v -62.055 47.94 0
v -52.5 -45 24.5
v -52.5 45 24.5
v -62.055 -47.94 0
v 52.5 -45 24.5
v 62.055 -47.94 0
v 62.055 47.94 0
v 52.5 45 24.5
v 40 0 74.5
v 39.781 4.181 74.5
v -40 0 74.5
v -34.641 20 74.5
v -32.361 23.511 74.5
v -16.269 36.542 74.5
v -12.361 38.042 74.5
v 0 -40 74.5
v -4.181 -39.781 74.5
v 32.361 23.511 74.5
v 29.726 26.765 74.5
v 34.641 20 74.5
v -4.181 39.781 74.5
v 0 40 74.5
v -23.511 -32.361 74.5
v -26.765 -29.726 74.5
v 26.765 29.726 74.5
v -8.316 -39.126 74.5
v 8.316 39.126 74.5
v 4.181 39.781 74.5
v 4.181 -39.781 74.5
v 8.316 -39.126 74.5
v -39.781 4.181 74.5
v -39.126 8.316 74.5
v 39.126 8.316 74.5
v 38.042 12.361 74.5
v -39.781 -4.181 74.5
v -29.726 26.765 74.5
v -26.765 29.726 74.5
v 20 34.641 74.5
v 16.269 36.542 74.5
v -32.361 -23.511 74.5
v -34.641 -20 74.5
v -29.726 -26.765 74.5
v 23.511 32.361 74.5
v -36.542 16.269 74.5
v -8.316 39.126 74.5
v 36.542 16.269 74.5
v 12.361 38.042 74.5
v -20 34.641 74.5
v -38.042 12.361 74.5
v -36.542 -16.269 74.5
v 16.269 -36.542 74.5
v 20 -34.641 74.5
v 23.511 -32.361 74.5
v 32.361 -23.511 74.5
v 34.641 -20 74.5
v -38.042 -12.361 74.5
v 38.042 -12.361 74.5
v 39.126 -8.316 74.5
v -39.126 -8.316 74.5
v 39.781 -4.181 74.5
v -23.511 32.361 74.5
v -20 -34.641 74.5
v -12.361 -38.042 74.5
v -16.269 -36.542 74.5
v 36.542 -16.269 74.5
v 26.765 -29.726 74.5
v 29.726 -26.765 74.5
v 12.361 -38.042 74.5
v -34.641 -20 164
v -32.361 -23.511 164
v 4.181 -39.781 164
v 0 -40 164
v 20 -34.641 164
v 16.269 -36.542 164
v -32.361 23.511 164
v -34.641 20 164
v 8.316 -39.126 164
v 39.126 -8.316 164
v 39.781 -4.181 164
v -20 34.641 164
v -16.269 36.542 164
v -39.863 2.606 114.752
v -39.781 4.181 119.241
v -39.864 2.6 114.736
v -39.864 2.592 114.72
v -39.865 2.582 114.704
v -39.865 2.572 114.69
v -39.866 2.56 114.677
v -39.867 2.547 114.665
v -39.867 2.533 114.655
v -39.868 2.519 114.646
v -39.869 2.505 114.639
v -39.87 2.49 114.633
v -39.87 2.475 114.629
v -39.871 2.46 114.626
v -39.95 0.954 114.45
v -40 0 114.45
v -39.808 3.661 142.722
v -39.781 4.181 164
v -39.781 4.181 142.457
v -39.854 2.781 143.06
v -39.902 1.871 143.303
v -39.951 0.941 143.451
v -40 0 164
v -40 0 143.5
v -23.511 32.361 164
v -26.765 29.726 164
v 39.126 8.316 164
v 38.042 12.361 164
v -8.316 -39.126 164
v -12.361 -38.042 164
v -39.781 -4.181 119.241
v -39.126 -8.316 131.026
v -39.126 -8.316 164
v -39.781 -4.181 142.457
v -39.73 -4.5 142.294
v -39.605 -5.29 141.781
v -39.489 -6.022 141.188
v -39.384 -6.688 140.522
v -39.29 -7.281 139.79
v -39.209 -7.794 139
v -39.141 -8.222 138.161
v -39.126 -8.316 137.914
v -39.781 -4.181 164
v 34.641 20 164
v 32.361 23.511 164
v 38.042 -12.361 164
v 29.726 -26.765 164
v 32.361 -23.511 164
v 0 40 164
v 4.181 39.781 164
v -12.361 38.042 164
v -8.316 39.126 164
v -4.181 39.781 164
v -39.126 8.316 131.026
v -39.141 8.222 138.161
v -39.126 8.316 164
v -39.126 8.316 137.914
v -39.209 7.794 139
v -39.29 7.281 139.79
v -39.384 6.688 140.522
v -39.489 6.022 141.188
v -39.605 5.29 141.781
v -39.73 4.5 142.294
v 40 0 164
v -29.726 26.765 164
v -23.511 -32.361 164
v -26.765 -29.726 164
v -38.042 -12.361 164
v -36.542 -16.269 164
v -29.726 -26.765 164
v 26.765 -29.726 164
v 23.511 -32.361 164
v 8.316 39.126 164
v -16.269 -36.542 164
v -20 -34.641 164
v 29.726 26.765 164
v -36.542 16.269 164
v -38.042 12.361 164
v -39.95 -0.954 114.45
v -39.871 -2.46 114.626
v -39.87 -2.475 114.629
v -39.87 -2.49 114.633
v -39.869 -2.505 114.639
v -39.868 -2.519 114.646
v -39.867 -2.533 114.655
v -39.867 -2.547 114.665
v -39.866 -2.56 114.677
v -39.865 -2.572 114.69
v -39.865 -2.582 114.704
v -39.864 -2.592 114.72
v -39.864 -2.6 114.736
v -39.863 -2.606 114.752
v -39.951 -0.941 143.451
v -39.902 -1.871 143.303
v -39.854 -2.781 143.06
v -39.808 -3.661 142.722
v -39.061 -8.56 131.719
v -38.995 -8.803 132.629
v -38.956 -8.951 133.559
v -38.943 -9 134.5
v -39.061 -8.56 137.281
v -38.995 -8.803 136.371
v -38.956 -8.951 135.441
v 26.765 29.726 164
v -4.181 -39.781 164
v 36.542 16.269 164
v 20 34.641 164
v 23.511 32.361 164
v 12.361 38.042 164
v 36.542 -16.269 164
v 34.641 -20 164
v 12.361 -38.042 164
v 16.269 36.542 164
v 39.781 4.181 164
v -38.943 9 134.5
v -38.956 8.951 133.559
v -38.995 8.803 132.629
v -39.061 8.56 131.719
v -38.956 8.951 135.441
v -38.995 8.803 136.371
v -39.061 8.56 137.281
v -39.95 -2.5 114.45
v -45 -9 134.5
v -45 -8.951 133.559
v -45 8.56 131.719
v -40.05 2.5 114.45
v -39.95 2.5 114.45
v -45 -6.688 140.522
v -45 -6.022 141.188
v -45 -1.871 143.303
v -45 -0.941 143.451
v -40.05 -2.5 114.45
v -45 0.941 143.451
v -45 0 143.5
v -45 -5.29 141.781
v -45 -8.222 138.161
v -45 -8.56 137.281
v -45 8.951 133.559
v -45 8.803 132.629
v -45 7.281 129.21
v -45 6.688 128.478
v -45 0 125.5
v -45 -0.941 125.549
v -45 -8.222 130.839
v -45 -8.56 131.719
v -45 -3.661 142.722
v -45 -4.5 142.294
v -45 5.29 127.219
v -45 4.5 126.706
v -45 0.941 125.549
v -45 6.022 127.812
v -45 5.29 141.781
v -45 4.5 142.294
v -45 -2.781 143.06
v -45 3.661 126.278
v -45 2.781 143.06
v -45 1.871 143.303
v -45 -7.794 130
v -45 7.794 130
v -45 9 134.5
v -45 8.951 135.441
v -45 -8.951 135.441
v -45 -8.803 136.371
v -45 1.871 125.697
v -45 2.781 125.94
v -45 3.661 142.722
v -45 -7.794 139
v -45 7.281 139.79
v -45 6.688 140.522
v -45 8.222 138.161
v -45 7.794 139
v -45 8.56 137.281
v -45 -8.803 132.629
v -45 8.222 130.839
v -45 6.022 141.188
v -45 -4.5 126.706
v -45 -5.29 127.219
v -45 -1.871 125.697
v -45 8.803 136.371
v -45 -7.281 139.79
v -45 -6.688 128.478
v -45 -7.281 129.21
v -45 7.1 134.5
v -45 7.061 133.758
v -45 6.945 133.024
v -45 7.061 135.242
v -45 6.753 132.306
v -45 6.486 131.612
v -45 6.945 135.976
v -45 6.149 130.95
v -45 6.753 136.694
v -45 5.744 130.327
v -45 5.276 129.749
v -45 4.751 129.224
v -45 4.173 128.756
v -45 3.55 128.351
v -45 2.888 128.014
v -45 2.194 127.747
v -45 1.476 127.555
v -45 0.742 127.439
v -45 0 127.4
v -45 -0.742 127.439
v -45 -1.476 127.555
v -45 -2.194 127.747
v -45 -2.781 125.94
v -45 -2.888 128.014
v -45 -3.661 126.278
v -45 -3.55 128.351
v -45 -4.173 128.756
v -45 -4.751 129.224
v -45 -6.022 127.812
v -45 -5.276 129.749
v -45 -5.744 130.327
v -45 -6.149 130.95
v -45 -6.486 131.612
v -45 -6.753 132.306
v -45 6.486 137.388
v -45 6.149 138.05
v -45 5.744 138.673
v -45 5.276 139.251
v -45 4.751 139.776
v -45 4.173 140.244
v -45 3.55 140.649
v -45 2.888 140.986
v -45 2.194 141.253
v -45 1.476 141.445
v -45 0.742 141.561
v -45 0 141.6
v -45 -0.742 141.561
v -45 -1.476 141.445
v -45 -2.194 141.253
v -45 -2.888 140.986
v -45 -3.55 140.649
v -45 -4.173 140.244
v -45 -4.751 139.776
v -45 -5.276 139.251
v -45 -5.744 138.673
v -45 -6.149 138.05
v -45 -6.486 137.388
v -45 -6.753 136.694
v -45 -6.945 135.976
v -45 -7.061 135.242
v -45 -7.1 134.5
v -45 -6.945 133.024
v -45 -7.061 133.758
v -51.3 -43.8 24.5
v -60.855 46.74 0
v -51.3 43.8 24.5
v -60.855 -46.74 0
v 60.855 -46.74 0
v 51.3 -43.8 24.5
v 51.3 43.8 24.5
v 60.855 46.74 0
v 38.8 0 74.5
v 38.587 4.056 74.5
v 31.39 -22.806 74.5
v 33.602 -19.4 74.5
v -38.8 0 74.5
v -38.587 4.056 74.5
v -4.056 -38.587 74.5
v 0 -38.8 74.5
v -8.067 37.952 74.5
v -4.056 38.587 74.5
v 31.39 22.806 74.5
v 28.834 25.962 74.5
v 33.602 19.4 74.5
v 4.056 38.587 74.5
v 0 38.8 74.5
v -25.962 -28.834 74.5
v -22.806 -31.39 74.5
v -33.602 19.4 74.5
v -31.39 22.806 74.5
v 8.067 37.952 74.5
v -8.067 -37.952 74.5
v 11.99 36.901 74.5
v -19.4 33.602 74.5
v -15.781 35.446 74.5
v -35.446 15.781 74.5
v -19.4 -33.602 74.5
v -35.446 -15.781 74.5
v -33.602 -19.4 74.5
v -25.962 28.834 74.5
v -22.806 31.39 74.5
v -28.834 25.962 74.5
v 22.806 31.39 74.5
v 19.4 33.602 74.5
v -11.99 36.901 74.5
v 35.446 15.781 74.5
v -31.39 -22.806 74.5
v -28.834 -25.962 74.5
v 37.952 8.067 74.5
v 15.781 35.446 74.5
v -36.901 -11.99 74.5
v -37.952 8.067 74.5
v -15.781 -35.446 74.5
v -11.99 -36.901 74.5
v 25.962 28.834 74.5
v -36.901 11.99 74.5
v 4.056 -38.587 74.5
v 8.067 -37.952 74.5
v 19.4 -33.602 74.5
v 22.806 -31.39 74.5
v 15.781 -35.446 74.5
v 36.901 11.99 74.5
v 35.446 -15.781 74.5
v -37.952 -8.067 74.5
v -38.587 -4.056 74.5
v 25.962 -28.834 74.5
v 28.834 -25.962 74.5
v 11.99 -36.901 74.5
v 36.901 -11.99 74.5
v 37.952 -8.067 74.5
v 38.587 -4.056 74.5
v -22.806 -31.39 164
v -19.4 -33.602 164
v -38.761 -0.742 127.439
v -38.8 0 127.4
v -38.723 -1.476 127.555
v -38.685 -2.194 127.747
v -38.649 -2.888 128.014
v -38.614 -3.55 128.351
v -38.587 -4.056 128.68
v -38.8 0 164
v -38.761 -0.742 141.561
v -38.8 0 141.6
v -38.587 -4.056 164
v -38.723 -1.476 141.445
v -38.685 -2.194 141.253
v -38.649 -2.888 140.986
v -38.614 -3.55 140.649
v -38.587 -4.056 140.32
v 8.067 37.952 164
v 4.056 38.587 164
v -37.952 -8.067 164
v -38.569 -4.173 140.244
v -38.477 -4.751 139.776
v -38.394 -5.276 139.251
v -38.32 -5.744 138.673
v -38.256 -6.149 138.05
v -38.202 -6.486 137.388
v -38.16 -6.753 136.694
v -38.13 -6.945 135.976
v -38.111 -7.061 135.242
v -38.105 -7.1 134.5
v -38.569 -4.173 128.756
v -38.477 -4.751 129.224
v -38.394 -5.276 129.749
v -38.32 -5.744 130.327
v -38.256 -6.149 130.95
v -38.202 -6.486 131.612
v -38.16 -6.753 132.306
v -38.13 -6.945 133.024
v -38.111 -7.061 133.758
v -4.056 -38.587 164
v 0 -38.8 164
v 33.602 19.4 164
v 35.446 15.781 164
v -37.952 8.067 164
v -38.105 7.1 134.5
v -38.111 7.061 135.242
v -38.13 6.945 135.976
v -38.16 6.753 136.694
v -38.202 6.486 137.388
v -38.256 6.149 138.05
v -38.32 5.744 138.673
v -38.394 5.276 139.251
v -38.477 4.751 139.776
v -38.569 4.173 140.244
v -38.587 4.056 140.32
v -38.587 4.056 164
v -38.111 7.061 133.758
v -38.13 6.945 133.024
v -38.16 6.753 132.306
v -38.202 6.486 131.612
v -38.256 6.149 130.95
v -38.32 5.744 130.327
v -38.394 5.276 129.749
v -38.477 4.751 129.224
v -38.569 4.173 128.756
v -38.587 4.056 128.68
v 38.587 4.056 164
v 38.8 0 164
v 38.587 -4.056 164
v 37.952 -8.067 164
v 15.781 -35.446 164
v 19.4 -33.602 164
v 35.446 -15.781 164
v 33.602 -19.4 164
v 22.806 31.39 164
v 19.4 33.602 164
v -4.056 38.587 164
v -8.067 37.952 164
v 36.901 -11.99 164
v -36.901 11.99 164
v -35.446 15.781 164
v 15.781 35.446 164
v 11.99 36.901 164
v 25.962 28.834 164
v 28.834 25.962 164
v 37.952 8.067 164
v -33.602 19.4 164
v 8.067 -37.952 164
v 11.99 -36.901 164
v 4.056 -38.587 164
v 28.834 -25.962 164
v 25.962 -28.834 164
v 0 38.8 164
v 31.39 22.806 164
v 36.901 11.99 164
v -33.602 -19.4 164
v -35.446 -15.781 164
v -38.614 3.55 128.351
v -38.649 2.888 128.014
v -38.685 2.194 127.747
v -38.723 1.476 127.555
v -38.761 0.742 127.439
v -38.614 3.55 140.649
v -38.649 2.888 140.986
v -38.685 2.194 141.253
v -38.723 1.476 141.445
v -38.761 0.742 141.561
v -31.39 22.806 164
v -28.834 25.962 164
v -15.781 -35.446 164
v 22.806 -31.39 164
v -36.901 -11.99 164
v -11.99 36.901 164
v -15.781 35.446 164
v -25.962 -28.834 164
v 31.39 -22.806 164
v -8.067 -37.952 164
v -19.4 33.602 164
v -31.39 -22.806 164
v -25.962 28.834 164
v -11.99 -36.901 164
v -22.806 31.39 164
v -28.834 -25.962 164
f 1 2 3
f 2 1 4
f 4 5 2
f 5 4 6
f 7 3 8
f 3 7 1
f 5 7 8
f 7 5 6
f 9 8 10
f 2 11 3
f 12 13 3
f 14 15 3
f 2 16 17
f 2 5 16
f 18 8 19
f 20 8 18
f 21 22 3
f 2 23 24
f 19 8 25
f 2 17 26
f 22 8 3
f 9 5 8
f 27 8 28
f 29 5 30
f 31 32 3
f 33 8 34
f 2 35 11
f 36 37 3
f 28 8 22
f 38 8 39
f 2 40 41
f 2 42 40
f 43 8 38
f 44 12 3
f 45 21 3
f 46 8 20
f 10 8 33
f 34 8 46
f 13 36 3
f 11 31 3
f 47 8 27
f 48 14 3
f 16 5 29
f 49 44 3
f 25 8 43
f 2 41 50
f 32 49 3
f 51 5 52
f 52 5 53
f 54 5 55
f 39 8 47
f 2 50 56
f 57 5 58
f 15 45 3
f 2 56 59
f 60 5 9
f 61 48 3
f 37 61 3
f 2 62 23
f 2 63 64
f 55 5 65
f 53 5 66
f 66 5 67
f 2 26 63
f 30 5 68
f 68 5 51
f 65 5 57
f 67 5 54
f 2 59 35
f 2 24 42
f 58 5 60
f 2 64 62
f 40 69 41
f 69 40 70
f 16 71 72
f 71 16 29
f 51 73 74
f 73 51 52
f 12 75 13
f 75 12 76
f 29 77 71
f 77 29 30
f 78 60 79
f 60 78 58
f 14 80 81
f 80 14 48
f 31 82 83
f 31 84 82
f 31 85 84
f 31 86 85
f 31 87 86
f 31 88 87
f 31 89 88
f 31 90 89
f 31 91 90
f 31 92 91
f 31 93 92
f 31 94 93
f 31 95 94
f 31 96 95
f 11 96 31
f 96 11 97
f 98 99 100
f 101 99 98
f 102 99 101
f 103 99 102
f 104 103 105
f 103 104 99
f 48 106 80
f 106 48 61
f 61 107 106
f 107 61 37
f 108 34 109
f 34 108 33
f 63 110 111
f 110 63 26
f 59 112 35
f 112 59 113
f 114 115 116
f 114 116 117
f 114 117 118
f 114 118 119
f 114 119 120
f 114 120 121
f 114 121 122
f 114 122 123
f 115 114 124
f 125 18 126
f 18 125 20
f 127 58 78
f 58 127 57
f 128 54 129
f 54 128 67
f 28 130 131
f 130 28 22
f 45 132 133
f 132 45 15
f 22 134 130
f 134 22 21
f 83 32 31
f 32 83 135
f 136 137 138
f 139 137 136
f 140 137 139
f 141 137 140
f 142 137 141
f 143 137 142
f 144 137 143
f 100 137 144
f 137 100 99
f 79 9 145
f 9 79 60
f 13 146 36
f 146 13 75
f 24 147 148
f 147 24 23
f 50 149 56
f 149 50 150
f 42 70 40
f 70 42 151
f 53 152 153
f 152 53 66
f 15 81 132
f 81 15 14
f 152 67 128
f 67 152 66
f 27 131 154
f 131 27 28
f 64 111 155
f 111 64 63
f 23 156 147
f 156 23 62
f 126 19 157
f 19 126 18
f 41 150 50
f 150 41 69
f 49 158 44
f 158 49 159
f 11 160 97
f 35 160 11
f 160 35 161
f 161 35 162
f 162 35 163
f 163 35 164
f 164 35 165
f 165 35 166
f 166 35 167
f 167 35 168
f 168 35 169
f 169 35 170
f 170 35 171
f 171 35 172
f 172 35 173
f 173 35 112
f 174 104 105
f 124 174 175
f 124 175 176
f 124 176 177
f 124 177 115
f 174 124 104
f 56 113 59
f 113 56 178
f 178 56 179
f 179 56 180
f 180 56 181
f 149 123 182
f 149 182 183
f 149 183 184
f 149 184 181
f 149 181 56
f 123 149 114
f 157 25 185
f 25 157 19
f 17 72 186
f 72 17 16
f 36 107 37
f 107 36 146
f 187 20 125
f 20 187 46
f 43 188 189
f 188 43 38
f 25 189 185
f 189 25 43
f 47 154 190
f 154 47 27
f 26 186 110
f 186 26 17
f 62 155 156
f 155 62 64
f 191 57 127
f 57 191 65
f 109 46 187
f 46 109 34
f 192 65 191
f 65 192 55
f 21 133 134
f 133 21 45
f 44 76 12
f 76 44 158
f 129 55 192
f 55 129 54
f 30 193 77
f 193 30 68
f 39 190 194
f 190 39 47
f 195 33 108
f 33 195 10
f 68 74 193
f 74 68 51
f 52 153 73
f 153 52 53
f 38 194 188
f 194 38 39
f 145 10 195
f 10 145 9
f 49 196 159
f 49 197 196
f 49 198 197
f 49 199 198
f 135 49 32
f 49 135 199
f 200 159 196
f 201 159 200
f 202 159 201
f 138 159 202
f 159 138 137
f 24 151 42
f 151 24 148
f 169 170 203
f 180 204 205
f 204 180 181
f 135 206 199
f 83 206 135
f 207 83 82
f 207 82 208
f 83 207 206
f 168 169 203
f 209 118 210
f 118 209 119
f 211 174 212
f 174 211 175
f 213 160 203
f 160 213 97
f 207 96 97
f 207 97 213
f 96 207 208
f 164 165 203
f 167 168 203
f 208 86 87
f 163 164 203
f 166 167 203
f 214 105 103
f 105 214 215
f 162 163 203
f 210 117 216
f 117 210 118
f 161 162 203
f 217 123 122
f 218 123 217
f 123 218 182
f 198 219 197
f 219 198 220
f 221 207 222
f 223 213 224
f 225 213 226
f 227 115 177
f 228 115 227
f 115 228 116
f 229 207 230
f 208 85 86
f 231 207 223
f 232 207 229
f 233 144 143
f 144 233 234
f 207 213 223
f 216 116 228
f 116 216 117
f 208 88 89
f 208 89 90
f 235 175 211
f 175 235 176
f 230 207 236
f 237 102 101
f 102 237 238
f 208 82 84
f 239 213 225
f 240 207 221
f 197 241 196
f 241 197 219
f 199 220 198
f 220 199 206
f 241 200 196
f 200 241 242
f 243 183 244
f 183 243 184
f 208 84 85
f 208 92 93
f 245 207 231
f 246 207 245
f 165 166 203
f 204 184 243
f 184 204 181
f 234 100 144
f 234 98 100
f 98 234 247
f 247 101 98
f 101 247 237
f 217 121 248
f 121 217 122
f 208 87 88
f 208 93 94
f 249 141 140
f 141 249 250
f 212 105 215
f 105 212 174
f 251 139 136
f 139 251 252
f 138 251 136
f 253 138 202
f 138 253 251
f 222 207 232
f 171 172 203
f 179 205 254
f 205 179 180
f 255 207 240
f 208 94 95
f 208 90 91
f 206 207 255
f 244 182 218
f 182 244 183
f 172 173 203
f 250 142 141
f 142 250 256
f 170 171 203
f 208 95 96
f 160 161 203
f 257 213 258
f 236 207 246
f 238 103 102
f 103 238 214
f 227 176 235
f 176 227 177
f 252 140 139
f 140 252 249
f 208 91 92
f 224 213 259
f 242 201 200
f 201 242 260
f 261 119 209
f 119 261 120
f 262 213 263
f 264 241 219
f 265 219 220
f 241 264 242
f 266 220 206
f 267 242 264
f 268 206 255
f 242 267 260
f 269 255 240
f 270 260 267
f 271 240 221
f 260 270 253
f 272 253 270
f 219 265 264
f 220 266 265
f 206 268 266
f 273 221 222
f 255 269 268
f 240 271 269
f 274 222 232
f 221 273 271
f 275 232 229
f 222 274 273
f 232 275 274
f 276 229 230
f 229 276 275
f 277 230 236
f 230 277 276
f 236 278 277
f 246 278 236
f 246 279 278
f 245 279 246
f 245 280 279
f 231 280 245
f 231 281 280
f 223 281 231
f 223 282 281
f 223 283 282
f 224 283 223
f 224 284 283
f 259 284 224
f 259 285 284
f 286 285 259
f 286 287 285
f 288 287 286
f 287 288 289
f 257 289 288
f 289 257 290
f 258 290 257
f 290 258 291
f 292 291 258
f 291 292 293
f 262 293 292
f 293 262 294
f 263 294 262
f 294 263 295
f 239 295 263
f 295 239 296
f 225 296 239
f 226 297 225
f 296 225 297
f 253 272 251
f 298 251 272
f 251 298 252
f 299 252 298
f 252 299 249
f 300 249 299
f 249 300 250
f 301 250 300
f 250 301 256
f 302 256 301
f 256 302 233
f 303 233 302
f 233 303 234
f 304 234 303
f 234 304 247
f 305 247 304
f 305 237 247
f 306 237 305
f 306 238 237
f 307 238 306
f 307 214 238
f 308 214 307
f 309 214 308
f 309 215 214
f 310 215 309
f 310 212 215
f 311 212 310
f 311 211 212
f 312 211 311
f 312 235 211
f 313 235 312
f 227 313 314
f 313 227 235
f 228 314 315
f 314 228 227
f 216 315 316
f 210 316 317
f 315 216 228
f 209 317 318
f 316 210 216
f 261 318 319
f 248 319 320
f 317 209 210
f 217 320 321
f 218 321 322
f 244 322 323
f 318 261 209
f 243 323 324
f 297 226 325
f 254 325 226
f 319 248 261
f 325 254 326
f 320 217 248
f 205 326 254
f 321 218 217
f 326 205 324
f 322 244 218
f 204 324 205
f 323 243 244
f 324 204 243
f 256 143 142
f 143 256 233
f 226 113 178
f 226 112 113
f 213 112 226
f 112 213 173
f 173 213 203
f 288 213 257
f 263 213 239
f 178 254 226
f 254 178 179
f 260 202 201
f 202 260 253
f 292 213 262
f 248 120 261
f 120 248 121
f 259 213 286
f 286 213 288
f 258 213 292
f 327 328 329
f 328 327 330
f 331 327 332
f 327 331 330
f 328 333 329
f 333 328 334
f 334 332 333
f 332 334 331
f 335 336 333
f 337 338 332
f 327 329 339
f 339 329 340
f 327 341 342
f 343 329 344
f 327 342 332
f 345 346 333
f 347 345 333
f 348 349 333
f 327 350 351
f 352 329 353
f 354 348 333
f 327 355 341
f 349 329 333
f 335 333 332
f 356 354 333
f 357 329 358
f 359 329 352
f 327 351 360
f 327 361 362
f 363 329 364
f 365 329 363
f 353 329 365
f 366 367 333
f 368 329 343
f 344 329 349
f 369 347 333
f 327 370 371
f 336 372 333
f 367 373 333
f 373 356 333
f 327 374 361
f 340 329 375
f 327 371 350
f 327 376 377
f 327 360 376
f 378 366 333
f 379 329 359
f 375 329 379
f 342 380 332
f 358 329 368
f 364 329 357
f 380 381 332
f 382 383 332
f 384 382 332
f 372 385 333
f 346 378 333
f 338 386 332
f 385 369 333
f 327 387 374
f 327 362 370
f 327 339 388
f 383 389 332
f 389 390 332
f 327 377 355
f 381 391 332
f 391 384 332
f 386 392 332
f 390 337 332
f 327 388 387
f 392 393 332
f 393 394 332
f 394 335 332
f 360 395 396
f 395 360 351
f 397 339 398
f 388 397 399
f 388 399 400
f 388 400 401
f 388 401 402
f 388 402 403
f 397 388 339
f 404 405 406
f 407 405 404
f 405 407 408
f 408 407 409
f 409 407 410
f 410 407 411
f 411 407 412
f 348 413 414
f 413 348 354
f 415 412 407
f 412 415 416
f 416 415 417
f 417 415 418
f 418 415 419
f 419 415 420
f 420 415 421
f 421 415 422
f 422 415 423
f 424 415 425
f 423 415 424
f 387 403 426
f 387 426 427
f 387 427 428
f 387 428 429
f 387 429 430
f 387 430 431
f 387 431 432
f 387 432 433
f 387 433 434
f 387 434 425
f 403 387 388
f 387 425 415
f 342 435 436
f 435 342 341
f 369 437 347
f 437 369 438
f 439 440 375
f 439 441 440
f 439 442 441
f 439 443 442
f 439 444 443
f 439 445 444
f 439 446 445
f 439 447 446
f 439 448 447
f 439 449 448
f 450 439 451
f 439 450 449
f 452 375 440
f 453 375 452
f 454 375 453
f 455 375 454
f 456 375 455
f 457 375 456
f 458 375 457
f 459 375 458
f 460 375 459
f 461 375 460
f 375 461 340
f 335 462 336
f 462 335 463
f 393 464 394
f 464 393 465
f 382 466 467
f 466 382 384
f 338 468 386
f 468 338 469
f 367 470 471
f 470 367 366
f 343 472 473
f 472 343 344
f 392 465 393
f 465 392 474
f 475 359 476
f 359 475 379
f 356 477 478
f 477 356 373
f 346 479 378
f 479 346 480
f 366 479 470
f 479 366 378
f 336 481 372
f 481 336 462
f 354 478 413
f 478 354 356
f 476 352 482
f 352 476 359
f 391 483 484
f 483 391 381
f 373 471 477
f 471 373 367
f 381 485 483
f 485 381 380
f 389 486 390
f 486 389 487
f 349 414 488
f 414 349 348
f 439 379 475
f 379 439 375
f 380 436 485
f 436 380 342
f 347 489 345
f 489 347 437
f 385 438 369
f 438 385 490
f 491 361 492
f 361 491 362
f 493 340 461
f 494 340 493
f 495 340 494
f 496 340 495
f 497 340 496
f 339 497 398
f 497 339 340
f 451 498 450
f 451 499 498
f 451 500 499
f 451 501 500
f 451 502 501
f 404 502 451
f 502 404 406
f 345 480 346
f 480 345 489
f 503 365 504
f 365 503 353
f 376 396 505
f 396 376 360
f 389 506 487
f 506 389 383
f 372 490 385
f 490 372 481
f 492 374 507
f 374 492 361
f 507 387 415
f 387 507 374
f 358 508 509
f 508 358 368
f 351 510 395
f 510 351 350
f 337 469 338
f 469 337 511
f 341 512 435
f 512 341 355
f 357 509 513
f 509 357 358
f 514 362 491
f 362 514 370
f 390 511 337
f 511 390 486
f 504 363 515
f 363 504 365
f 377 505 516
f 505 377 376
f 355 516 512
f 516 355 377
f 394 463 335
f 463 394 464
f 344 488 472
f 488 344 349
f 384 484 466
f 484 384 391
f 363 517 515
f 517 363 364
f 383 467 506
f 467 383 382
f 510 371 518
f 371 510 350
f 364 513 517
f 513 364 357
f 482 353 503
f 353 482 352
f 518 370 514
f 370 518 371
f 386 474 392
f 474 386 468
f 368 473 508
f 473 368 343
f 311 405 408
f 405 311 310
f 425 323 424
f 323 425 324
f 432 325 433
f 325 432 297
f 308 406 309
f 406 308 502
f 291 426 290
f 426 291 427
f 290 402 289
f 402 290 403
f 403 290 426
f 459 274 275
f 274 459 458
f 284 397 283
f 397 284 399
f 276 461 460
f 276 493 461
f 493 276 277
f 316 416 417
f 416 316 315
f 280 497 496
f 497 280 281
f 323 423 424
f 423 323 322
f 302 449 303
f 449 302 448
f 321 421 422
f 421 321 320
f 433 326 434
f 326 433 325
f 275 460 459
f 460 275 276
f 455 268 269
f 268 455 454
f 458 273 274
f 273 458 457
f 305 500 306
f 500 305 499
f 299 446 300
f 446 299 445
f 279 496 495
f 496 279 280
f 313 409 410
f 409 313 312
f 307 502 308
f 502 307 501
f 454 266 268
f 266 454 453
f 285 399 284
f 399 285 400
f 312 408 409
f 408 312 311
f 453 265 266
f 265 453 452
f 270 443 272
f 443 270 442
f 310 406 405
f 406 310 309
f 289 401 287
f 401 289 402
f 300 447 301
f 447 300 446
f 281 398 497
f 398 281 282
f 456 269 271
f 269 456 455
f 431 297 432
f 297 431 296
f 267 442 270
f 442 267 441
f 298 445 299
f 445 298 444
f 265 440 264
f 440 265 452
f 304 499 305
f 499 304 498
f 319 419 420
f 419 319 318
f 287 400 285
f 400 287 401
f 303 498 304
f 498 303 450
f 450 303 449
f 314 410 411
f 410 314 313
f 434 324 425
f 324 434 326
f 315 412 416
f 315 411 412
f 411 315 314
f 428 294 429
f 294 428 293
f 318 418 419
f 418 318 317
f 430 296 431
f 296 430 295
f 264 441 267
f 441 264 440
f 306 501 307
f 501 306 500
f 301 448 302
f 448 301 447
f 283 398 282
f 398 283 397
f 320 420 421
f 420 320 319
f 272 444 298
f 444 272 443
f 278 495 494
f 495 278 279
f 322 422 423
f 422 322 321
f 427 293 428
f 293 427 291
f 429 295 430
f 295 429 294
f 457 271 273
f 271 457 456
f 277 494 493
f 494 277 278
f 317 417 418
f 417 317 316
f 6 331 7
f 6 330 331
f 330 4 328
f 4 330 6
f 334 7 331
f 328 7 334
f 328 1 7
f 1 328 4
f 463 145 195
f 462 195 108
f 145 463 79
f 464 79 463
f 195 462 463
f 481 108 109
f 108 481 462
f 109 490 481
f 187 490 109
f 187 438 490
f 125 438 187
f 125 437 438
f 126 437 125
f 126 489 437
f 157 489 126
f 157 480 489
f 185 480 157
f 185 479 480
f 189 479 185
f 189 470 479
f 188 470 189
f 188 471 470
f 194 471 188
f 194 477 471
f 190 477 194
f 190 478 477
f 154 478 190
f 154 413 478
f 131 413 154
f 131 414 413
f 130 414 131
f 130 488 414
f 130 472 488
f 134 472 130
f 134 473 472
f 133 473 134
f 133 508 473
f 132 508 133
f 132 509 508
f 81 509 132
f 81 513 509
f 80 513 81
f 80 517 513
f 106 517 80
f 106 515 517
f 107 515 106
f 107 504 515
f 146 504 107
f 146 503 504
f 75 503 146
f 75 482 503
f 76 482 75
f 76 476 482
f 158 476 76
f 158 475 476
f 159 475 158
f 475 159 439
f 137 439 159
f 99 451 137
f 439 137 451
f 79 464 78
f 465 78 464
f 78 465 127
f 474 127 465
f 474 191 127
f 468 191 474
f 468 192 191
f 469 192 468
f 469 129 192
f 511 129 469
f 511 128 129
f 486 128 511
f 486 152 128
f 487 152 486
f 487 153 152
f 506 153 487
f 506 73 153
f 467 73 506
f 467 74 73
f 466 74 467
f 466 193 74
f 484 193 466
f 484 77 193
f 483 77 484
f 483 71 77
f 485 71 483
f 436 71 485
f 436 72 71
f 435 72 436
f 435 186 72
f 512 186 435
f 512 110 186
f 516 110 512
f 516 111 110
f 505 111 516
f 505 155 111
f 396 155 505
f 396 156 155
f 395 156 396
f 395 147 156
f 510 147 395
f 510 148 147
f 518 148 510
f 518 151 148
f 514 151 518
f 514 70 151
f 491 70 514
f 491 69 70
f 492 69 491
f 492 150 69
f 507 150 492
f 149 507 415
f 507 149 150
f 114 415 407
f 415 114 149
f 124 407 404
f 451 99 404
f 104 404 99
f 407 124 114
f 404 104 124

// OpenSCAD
module manif1(d) {
  union() {
    hull() {
      translate([0, 0, 0.25+300])
        cube([300-d*2, 150-d*2, 0.5], center=true);
      translate([0, 0, 0.25+50])
        cube([300*.35-d*2, 150*.6-d*2, 0.5], center=true);
    }

    hull() {
      translate([0, 0, 0.25+50])
        cube([300*.35-d*2, 150*.6-d*2, 0.5], center=true);
      translate([0, 0, 0.25])
        cylinder(r1=40-d, r2=40-d,$fn=60, h=0.5, center=true);     
    }

    hull() {
      translate([0, 0, 0.25])
        cylinder(r1=40-d, r2=40-d,$fn=60, h=0.5, center=true);     

      translate([0, 0, 0.25-100])
        cylinder(r1=40-d, r2=40-d,$fn=60, h=0.5, center=true);     
    }
  }
}

translate([0, 0, 139/2+5])
  rotate([0, 180, 0])
    intersection() {
      difference() {
        union() {
          manif1(0);
          translate([40, 0, -60]) {
            hull() {
              translate([0, 0, 20])
                cube([0.1, 5, 0.1], center=true);
              rotate([0, 90, 0])
                cylinder(r1=9, r2=9, $fn=60, h=10, center=true);          
            }
          }
        }
        union() { 
          manif1(1.2);
          translate([40, 0, -60]) 
            rotate([0, 90, 0])
              cylinder(r1=14.2/2, r2=14.2/2, $fn=60, h=12, center=true);
        }        
      }      
      translate([0, 0, 5-25/2])
        cube([1000, 1000, 139+25], center=true);
    }
